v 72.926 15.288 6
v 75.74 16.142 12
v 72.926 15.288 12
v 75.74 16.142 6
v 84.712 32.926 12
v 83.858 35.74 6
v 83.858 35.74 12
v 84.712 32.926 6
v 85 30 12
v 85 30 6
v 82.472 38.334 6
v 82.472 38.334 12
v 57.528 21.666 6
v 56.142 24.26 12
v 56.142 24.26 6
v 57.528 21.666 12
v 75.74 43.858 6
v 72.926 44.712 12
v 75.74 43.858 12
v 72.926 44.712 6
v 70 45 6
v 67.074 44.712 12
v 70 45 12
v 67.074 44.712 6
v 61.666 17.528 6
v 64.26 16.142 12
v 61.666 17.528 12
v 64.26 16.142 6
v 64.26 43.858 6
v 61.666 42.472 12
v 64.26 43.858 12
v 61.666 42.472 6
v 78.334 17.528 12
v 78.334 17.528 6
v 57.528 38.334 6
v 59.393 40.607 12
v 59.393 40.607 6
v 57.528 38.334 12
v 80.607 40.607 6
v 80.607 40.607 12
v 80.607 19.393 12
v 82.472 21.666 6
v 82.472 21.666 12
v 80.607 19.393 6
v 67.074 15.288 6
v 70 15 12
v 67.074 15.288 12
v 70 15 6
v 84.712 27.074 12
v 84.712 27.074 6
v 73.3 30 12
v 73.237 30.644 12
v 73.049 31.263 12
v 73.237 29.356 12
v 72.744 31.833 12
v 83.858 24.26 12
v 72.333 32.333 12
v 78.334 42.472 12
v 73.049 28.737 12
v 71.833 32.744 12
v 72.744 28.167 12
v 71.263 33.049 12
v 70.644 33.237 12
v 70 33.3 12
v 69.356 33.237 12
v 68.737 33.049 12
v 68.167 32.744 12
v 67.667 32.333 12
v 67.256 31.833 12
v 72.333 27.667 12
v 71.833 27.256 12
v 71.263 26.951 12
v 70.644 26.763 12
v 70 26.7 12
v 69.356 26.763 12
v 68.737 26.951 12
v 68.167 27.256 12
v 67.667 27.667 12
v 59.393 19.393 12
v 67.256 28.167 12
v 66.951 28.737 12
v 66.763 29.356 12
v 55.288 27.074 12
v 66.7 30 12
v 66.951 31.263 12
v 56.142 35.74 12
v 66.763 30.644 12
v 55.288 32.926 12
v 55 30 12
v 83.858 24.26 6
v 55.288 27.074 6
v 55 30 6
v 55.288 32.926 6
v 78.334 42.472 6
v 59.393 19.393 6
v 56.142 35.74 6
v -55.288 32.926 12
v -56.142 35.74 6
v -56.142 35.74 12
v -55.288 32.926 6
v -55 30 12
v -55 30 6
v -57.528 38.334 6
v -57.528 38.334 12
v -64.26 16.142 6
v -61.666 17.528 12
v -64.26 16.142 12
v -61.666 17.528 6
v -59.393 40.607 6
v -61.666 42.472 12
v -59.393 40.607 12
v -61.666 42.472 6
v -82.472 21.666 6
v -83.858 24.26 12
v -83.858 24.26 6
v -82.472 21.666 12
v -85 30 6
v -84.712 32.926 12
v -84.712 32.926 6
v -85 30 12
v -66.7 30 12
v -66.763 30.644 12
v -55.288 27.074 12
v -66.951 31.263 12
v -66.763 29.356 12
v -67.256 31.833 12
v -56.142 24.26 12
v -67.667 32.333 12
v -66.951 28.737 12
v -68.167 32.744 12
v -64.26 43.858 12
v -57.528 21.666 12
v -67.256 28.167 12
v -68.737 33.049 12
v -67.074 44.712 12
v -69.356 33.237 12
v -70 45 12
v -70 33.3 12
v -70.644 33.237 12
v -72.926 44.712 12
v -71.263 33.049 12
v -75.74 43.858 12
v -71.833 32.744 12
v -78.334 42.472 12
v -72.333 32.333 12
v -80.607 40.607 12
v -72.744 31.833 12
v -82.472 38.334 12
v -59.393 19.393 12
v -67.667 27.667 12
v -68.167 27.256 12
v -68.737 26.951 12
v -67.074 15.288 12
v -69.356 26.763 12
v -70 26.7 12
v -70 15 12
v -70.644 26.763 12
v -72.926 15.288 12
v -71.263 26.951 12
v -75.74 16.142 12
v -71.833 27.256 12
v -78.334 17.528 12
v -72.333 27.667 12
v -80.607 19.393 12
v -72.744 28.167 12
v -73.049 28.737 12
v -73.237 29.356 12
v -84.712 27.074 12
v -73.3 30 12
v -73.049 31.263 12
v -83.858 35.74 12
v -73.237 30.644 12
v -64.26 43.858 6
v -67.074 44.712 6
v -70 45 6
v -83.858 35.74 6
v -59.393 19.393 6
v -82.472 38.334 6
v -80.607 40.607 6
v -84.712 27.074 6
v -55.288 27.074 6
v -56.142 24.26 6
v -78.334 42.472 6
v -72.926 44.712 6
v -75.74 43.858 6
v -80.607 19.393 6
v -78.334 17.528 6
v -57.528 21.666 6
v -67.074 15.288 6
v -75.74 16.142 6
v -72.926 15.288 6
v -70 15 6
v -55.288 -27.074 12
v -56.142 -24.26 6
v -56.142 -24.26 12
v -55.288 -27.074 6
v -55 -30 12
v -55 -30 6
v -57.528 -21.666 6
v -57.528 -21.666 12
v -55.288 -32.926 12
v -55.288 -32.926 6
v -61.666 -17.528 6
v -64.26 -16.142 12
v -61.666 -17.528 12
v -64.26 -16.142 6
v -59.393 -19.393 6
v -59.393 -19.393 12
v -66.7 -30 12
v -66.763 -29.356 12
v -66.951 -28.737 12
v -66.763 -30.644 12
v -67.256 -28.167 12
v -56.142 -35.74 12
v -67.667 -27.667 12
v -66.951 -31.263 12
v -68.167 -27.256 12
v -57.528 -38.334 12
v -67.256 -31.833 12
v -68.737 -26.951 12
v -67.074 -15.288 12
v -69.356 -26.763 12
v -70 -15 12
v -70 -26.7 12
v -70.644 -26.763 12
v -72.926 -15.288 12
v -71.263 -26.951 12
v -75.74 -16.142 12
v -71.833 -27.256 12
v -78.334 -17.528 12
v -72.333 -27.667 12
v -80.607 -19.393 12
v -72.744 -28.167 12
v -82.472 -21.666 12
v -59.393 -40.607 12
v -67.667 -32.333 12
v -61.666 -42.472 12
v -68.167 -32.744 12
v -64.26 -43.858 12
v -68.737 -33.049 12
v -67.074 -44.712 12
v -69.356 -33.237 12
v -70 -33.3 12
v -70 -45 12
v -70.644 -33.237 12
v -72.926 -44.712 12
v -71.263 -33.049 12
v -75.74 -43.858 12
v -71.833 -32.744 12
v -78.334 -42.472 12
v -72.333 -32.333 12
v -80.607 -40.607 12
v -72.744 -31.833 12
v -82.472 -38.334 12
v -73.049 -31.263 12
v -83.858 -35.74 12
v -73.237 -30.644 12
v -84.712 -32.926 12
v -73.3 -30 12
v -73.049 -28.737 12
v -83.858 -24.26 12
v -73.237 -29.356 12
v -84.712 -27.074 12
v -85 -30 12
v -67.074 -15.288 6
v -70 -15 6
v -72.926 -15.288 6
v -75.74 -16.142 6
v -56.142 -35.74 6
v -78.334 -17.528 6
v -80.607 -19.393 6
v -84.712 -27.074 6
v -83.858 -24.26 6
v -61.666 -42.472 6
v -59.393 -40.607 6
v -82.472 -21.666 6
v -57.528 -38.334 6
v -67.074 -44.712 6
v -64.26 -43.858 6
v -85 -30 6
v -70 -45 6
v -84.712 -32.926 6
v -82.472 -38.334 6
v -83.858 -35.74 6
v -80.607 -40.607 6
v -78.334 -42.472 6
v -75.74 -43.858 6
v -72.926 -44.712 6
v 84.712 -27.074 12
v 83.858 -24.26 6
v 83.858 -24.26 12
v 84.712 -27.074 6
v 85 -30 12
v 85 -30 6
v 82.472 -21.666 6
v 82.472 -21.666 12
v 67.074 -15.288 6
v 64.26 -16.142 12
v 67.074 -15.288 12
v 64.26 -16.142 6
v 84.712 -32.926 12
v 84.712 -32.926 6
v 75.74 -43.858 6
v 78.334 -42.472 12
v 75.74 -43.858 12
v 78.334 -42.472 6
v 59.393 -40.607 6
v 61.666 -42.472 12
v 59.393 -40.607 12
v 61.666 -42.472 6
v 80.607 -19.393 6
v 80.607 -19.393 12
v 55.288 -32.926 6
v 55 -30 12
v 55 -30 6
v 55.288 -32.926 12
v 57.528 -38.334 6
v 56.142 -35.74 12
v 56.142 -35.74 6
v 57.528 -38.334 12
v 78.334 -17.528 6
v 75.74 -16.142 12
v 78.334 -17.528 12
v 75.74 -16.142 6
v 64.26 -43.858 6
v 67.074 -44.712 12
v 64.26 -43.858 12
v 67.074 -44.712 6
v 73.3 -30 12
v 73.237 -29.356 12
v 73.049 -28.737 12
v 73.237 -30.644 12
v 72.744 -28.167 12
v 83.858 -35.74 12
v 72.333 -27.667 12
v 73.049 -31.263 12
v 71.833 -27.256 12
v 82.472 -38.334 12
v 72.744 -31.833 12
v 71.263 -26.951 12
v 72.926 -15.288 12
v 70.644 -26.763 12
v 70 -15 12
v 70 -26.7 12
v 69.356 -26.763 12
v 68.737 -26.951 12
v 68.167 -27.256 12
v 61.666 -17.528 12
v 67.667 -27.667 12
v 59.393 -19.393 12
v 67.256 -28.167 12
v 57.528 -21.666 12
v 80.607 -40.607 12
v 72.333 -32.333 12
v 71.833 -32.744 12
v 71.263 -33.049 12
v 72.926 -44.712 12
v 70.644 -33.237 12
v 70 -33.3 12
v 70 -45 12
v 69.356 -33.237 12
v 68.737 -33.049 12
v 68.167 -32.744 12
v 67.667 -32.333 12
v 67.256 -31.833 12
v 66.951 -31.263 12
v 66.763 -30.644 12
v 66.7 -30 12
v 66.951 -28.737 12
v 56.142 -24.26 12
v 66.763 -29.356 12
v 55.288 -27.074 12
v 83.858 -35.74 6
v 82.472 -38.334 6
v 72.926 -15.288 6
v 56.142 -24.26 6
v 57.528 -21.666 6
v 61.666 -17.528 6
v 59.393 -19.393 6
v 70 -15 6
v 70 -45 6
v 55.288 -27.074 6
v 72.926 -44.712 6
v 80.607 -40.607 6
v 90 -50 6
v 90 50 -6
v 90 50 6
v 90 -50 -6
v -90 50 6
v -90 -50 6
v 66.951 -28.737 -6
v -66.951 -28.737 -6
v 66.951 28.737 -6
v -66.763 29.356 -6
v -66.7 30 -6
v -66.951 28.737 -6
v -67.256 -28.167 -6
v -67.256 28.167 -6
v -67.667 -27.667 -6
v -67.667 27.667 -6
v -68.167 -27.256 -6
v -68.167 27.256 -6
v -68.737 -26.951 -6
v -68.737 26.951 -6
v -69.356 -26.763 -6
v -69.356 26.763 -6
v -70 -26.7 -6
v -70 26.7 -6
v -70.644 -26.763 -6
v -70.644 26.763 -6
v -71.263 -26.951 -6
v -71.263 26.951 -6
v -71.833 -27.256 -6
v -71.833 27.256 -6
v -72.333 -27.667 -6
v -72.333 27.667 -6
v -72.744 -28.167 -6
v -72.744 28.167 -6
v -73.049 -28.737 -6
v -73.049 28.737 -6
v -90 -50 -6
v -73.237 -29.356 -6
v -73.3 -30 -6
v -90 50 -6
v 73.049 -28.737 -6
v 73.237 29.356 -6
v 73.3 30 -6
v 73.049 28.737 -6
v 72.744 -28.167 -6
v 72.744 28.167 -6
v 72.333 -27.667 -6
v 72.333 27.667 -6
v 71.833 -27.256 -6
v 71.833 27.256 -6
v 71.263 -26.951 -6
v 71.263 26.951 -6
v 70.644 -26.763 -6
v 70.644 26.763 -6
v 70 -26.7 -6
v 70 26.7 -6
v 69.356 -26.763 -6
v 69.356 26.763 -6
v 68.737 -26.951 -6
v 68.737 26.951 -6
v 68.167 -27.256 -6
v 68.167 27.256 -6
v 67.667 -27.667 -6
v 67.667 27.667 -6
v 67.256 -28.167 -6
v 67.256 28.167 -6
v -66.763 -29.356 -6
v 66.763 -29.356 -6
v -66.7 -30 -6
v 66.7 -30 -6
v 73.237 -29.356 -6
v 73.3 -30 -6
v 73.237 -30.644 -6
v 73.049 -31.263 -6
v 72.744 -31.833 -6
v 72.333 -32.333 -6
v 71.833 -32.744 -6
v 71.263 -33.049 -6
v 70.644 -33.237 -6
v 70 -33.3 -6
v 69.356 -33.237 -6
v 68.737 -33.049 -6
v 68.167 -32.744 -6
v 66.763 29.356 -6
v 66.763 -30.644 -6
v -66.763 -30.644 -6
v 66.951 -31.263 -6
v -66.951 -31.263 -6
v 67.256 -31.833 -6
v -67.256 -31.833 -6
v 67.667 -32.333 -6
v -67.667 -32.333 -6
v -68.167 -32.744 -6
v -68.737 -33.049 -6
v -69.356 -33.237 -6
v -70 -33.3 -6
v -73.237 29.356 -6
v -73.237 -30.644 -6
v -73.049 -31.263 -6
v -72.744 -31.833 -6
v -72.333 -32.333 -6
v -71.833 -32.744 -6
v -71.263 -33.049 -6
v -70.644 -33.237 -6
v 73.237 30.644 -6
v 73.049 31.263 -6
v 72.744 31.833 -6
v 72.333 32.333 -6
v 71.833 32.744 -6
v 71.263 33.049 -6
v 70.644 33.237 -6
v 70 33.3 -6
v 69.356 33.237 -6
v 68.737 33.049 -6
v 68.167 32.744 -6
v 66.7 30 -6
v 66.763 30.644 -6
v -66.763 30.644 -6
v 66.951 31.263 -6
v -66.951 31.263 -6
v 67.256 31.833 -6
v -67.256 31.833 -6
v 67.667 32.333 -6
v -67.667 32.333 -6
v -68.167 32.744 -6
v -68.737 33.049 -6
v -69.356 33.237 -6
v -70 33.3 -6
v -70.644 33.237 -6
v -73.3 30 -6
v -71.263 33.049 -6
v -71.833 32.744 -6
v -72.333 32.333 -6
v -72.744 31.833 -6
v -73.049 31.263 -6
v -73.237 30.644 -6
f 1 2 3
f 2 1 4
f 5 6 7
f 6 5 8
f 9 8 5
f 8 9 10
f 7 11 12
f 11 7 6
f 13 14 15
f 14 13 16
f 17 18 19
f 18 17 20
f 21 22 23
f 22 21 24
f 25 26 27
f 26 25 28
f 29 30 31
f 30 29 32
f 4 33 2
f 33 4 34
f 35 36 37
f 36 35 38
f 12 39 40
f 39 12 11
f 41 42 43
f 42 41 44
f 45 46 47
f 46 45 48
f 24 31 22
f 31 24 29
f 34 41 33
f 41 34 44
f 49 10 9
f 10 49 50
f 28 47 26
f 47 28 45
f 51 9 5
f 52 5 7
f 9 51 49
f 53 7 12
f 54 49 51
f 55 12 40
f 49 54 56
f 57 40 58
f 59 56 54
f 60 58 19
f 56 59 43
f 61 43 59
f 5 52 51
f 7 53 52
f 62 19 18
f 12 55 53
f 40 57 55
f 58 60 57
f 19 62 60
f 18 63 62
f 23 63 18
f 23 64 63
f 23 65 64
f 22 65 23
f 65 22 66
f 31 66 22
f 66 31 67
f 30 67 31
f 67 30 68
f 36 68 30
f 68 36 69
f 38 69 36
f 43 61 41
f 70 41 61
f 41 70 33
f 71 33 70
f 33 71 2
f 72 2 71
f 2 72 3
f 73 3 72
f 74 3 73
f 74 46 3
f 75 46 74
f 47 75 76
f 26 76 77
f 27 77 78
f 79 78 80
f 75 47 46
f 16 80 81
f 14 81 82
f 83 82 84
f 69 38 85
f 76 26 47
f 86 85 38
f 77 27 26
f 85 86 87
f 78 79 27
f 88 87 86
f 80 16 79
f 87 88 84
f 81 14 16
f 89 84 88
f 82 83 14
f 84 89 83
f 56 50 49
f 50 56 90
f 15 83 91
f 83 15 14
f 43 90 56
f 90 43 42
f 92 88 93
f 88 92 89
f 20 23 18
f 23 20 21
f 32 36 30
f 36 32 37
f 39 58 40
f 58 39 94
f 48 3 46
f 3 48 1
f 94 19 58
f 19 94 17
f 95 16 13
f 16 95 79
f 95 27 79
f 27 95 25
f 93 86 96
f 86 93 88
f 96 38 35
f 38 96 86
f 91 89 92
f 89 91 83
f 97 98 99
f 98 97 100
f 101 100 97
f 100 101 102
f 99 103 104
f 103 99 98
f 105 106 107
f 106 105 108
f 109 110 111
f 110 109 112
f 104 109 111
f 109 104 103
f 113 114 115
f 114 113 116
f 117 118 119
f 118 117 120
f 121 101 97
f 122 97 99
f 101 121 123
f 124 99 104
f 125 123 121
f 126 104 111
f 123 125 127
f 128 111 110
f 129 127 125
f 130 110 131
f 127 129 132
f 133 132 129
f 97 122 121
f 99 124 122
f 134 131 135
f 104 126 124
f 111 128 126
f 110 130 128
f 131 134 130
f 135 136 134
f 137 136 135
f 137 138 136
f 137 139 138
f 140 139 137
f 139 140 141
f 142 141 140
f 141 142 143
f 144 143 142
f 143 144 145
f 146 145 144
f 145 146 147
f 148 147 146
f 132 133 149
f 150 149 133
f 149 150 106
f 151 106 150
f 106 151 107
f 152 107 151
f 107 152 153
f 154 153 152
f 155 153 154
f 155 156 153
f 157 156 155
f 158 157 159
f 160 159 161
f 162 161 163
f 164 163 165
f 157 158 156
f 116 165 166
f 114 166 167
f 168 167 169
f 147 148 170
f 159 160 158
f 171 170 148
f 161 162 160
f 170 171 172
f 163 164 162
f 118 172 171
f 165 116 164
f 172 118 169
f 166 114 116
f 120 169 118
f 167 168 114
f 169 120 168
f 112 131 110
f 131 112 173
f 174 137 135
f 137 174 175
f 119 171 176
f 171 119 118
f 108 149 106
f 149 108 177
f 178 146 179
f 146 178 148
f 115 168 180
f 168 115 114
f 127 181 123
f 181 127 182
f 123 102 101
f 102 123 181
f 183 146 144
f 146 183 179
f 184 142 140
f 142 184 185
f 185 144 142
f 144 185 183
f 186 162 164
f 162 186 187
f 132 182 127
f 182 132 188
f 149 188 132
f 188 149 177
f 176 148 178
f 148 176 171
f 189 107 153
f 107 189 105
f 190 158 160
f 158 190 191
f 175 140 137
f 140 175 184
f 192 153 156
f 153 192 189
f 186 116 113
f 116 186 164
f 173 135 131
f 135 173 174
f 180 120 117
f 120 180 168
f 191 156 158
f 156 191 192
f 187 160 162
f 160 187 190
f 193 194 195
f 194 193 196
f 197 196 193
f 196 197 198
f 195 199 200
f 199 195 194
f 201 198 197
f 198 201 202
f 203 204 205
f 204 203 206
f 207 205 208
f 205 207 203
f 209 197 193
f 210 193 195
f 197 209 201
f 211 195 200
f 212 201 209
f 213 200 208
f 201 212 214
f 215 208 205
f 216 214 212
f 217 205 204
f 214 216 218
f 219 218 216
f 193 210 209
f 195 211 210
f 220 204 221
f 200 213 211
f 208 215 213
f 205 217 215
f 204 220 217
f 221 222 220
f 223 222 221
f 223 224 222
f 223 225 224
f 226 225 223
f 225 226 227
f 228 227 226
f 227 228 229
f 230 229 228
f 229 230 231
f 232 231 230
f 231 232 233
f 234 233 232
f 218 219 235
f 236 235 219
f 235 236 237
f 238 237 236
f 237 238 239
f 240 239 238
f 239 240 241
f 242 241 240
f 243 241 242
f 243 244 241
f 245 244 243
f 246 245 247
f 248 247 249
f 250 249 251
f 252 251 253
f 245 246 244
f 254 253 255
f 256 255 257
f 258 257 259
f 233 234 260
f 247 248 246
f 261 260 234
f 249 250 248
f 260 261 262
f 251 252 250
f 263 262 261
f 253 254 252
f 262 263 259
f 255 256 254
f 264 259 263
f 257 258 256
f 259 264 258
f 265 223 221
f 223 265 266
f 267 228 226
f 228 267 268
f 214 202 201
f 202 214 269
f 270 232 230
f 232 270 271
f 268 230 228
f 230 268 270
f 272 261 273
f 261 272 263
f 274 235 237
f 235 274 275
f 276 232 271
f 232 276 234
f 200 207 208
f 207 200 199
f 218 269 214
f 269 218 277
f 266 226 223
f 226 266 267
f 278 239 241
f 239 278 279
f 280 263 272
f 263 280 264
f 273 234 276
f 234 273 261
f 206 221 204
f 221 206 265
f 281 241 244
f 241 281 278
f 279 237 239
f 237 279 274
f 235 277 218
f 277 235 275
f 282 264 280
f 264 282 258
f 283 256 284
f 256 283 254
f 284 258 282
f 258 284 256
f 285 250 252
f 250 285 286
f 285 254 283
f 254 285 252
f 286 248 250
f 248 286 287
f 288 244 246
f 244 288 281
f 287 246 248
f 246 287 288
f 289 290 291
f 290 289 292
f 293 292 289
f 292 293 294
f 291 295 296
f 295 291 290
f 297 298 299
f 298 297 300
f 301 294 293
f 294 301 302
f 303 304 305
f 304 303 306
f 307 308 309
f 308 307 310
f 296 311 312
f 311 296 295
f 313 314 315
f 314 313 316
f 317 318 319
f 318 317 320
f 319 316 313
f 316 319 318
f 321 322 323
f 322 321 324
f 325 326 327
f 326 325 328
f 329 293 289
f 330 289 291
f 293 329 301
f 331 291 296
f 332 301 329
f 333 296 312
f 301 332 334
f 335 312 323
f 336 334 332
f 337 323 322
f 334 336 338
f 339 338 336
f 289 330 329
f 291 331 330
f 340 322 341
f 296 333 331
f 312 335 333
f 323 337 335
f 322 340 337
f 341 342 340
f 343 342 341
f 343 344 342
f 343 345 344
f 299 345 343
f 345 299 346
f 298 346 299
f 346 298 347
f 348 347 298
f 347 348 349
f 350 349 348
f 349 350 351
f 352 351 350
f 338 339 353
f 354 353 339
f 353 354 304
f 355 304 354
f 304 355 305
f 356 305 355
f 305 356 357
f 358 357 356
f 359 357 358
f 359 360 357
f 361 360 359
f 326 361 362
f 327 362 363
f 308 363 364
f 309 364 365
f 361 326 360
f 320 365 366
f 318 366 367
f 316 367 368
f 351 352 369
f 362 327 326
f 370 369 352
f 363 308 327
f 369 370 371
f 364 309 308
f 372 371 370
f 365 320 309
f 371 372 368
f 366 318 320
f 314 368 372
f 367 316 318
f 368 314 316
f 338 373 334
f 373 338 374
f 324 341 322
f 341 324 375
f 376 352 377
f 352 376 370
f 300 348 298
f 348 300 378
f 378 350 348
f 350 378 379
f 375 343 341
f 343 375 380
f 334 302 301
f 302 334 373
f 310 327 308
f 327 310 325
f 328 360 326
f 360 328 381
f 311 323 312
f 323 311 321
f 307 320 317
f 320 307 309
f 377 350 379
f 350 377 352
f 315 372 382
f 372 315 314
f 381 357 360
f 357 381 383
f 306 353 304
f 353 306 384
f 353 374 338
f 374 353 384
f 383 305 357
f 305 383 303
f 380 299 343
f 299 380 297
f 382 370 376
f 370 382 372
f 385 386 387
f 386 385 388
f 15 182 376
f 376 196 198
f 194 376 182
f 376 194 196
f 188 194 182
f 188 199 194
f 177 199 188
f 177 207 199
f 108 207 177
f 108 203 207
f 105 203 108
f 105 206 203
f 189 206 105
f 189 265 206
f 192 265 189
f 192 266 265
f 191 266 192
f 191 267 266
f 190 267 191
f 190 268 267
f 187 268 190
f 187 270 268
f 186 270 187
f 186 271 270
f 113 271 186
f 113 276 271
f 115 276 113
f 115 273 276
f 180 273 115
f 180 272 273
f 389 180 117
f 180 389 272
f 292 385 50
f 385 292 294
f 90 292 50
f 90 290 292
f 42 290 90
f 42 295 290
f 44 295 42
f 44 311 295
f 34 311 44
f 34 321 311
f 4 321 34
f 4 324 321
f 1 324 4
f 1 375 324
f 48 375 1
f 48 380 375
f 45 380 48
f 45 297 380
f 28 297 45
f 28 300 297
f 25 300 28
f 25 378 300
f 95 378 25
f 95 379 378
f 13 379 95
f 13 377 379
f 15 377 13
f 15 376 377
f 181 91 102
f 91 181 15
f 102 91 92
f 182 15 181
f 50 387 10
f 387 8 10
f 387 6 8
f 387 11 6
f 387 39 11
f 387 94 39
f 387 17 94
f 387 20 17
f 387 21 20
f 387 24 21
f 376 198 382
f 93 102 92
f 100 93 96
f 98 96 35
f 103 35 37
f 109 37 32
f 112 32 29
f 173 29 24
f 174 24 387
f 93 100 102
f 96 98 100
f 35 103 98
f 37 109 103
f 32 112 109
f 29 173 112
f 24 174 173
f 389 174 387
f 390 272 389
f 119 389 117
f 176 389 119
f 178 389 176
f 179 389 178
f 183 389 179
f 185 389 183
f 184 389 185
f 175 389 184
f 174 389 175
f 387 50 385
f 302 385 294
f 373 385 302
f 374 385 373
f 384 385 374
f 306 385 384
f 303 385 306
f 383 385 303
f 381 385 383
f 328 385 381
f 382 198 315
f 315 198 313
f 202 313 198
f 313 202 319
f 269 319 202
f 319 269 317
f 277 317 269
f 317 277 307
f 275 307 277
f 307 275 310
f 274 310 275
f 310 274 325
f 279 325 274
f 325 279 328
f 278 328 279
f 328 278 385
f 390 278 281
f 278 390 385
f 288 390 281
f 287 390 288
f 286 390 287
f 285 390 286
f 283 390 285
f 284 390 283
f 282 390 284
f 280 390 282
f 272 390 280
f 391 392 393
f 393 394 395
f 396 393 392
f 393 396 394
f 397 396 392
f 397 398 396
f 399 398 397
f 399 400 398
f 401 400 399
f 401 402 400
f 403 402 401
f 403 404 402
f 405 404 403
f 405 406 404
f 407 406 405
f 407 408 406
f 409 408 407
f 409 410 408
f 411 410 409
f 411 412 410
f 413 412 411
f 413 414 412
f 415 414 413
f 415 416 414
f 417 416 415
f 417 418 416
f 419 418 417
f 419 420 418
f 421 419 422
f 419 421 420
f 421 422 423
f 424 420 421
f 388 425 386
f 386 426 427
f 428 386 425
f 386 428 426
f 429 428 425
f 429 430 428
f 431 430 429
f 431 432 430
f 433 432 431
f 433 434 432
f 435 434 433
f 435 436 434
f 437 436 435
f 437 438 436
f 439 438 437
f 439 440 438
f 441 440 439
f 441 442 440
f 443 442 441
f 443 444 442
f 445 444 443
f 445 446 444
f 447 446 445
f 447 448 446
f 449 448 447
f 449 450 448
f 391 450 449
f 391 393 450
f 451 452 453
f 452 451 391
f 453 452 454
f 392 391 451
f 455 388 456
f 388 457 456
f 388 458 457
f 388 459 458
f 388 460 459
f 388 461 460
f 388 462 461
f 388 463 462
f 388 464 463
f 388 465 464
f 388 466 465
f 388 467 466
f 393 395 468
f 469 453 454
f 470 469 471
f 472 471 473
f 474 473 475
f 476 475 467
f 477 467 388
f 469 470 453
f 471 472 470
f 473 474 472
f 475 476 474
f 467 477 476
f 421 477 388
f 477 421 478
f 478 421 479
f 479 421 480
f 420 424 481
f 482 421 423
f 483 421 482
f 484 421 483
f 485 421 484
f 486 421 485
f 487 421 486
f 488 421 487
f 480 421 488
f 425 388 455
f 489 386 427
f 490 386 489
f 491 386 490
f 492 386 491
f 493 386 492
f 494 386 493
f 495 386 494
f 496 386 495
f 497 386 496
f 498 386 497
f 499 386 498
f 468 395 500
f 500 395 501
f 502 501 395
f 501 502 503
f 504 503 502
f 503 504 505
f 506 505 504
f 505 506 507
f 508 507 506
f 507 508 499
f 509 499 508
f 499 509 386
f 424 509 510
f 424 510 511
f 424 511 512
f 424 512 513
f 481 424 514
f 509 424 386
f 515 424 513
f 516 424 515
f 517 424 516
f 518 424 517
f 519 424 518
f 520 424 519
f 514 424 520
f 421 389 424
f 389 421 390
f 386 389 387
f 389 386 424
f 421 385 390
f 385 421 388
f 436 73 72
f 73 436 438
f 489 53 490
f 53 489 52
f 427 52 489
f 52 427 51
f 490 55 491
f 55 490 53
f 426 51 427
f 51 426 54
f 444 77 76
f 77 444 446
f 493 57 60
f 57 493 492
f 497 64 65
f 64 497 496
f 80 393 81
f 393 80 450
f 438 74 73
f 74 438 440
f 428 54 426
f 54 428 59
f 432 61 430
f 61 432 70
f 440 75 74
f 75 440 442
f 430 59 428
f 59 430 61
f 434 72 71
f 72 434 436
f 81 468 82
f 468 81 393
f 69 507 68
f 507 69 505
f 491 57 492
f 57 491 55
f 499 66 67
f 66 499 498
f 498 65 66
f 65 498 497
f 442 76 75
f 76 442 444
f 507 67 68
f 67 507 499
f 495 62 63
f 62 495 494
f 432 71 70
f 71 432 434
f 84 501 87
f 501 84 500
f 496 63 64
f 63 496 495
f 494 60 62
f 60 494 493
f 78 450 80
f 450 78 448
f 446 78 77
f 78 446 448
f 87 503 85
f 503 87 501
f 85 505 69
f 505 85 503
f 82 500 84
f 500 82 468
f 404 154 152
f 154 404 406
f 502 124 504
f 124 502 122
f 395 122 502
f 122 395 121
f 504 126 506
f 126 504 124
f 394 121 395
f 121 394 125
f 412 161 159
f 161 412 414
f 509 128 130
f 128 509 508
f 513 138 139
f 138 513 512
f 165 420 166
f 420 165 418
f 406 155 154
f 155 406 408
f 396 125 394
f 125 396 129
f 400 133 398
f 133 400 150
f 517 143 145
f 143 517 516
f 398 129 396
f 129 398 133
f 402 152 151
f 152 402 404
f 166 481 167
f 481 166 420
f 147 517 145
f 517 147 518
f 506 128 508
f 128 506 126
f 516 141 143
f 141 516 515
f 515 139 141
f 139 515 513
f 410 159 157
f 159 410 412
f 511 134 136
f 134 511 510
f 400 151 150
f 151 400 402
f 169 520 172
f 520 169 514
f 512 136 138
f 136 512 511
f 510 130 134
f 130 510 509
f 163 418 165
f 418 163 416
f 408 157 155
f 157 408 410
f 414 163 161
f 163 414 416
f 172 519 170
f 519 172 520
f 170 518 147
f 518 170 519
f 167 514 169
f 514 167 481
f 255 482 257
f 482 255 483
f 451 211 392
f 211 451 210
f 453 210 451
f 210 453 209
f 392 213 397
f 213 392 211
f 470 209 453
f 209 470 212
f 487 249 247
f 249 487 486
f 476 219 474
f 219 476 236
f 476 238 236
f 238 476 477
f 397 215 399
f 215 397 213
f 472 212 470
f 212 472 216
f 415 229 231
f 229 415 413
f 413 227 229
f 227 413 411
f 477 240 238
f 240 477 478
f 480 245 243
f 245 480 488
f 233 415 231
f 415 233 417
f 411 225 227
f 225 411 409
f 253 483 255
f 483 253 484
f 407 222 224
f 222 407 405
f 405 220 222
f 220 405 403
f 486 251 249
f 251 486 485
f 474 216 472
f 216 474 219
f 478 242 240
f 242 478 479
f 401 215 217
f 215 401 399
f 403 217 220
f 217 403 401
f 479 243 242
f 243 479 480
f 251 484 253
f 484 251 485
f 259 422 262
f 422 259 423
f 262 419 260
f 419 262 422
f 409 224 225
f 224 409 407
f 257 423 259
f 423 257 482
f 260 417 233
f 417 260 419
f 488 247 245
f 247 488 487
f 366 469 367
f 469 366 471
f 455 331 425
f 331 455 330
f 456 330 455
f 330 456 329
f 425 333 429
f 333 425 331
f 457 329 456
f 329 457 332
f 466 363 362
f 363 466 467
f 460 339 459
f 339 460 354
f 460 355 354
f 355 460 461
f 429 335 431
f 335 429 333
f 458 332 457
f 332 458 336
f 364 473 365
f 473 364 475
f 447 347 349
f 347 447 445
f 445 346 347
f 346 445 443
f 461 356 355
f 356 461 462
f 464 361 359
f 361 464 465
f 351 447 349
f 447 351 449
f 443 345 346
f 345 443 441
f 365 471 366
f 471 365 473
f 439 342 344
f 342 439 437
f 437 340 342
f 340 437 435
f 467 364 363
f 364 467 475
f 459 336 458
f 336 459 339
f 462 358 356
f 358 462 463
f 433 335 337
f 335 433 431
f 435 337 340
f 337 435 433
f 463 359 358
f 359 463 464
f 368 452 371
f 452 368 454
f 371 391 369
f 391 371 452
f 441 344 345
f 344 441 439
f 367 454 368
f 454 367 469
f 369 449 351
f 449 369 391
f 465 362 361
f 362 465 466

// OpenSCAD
$fn = 32;

// ----------------------------------------------------------------------
// Anchor pads 180 x 100 x 18
// four corner bosses with anchor holes
// ----------------------------------------------------------------------

// --- parameters (mm) ---
plate = [180, 100, 12];  // base plate size (x, y, z)
pads = 4;                // boss count, one per corner
edge = 20;               // boss centre offset from the plate edge
boss_d = 30;             // boss diameter
boss_h = 6;              // boss height above the base plate
hole_d = 6.6;            // hole diameter

// --- derived feature positions (mm) ---
height = plate[2] + boss_h;      // = 18   overall height of the part
corner_x = plate[0] / 2 - edge;  // = 70   boss centre X
corner_y = plate[1] / 2 - edge;  // = 30   boss centre Y
feature_centers = [
  [corner_x, corner_y],
  [-corner_x, corner_y],
  [-corner_x, -corner_y],
  [corner_x, -corner_y]
];   // boss centres, anchor holes are drilled there

// base plate, four bosses standing on it, anchor holes all the way through
difference() {
  union() {
    cube(plate, center = true);
    for (centre = feature_centers)
      translate([centre[0], centre[1], plate[2] / 2 - 1])
        cylinder(d = boss_d, h = boss_h + 1);
  }
  for (centre = feature_centers)
    translate([centre[0], centre[1], -height])
      cylinder(d = hole_d, h = 2 * height + 2);  // through boss and plate
}
